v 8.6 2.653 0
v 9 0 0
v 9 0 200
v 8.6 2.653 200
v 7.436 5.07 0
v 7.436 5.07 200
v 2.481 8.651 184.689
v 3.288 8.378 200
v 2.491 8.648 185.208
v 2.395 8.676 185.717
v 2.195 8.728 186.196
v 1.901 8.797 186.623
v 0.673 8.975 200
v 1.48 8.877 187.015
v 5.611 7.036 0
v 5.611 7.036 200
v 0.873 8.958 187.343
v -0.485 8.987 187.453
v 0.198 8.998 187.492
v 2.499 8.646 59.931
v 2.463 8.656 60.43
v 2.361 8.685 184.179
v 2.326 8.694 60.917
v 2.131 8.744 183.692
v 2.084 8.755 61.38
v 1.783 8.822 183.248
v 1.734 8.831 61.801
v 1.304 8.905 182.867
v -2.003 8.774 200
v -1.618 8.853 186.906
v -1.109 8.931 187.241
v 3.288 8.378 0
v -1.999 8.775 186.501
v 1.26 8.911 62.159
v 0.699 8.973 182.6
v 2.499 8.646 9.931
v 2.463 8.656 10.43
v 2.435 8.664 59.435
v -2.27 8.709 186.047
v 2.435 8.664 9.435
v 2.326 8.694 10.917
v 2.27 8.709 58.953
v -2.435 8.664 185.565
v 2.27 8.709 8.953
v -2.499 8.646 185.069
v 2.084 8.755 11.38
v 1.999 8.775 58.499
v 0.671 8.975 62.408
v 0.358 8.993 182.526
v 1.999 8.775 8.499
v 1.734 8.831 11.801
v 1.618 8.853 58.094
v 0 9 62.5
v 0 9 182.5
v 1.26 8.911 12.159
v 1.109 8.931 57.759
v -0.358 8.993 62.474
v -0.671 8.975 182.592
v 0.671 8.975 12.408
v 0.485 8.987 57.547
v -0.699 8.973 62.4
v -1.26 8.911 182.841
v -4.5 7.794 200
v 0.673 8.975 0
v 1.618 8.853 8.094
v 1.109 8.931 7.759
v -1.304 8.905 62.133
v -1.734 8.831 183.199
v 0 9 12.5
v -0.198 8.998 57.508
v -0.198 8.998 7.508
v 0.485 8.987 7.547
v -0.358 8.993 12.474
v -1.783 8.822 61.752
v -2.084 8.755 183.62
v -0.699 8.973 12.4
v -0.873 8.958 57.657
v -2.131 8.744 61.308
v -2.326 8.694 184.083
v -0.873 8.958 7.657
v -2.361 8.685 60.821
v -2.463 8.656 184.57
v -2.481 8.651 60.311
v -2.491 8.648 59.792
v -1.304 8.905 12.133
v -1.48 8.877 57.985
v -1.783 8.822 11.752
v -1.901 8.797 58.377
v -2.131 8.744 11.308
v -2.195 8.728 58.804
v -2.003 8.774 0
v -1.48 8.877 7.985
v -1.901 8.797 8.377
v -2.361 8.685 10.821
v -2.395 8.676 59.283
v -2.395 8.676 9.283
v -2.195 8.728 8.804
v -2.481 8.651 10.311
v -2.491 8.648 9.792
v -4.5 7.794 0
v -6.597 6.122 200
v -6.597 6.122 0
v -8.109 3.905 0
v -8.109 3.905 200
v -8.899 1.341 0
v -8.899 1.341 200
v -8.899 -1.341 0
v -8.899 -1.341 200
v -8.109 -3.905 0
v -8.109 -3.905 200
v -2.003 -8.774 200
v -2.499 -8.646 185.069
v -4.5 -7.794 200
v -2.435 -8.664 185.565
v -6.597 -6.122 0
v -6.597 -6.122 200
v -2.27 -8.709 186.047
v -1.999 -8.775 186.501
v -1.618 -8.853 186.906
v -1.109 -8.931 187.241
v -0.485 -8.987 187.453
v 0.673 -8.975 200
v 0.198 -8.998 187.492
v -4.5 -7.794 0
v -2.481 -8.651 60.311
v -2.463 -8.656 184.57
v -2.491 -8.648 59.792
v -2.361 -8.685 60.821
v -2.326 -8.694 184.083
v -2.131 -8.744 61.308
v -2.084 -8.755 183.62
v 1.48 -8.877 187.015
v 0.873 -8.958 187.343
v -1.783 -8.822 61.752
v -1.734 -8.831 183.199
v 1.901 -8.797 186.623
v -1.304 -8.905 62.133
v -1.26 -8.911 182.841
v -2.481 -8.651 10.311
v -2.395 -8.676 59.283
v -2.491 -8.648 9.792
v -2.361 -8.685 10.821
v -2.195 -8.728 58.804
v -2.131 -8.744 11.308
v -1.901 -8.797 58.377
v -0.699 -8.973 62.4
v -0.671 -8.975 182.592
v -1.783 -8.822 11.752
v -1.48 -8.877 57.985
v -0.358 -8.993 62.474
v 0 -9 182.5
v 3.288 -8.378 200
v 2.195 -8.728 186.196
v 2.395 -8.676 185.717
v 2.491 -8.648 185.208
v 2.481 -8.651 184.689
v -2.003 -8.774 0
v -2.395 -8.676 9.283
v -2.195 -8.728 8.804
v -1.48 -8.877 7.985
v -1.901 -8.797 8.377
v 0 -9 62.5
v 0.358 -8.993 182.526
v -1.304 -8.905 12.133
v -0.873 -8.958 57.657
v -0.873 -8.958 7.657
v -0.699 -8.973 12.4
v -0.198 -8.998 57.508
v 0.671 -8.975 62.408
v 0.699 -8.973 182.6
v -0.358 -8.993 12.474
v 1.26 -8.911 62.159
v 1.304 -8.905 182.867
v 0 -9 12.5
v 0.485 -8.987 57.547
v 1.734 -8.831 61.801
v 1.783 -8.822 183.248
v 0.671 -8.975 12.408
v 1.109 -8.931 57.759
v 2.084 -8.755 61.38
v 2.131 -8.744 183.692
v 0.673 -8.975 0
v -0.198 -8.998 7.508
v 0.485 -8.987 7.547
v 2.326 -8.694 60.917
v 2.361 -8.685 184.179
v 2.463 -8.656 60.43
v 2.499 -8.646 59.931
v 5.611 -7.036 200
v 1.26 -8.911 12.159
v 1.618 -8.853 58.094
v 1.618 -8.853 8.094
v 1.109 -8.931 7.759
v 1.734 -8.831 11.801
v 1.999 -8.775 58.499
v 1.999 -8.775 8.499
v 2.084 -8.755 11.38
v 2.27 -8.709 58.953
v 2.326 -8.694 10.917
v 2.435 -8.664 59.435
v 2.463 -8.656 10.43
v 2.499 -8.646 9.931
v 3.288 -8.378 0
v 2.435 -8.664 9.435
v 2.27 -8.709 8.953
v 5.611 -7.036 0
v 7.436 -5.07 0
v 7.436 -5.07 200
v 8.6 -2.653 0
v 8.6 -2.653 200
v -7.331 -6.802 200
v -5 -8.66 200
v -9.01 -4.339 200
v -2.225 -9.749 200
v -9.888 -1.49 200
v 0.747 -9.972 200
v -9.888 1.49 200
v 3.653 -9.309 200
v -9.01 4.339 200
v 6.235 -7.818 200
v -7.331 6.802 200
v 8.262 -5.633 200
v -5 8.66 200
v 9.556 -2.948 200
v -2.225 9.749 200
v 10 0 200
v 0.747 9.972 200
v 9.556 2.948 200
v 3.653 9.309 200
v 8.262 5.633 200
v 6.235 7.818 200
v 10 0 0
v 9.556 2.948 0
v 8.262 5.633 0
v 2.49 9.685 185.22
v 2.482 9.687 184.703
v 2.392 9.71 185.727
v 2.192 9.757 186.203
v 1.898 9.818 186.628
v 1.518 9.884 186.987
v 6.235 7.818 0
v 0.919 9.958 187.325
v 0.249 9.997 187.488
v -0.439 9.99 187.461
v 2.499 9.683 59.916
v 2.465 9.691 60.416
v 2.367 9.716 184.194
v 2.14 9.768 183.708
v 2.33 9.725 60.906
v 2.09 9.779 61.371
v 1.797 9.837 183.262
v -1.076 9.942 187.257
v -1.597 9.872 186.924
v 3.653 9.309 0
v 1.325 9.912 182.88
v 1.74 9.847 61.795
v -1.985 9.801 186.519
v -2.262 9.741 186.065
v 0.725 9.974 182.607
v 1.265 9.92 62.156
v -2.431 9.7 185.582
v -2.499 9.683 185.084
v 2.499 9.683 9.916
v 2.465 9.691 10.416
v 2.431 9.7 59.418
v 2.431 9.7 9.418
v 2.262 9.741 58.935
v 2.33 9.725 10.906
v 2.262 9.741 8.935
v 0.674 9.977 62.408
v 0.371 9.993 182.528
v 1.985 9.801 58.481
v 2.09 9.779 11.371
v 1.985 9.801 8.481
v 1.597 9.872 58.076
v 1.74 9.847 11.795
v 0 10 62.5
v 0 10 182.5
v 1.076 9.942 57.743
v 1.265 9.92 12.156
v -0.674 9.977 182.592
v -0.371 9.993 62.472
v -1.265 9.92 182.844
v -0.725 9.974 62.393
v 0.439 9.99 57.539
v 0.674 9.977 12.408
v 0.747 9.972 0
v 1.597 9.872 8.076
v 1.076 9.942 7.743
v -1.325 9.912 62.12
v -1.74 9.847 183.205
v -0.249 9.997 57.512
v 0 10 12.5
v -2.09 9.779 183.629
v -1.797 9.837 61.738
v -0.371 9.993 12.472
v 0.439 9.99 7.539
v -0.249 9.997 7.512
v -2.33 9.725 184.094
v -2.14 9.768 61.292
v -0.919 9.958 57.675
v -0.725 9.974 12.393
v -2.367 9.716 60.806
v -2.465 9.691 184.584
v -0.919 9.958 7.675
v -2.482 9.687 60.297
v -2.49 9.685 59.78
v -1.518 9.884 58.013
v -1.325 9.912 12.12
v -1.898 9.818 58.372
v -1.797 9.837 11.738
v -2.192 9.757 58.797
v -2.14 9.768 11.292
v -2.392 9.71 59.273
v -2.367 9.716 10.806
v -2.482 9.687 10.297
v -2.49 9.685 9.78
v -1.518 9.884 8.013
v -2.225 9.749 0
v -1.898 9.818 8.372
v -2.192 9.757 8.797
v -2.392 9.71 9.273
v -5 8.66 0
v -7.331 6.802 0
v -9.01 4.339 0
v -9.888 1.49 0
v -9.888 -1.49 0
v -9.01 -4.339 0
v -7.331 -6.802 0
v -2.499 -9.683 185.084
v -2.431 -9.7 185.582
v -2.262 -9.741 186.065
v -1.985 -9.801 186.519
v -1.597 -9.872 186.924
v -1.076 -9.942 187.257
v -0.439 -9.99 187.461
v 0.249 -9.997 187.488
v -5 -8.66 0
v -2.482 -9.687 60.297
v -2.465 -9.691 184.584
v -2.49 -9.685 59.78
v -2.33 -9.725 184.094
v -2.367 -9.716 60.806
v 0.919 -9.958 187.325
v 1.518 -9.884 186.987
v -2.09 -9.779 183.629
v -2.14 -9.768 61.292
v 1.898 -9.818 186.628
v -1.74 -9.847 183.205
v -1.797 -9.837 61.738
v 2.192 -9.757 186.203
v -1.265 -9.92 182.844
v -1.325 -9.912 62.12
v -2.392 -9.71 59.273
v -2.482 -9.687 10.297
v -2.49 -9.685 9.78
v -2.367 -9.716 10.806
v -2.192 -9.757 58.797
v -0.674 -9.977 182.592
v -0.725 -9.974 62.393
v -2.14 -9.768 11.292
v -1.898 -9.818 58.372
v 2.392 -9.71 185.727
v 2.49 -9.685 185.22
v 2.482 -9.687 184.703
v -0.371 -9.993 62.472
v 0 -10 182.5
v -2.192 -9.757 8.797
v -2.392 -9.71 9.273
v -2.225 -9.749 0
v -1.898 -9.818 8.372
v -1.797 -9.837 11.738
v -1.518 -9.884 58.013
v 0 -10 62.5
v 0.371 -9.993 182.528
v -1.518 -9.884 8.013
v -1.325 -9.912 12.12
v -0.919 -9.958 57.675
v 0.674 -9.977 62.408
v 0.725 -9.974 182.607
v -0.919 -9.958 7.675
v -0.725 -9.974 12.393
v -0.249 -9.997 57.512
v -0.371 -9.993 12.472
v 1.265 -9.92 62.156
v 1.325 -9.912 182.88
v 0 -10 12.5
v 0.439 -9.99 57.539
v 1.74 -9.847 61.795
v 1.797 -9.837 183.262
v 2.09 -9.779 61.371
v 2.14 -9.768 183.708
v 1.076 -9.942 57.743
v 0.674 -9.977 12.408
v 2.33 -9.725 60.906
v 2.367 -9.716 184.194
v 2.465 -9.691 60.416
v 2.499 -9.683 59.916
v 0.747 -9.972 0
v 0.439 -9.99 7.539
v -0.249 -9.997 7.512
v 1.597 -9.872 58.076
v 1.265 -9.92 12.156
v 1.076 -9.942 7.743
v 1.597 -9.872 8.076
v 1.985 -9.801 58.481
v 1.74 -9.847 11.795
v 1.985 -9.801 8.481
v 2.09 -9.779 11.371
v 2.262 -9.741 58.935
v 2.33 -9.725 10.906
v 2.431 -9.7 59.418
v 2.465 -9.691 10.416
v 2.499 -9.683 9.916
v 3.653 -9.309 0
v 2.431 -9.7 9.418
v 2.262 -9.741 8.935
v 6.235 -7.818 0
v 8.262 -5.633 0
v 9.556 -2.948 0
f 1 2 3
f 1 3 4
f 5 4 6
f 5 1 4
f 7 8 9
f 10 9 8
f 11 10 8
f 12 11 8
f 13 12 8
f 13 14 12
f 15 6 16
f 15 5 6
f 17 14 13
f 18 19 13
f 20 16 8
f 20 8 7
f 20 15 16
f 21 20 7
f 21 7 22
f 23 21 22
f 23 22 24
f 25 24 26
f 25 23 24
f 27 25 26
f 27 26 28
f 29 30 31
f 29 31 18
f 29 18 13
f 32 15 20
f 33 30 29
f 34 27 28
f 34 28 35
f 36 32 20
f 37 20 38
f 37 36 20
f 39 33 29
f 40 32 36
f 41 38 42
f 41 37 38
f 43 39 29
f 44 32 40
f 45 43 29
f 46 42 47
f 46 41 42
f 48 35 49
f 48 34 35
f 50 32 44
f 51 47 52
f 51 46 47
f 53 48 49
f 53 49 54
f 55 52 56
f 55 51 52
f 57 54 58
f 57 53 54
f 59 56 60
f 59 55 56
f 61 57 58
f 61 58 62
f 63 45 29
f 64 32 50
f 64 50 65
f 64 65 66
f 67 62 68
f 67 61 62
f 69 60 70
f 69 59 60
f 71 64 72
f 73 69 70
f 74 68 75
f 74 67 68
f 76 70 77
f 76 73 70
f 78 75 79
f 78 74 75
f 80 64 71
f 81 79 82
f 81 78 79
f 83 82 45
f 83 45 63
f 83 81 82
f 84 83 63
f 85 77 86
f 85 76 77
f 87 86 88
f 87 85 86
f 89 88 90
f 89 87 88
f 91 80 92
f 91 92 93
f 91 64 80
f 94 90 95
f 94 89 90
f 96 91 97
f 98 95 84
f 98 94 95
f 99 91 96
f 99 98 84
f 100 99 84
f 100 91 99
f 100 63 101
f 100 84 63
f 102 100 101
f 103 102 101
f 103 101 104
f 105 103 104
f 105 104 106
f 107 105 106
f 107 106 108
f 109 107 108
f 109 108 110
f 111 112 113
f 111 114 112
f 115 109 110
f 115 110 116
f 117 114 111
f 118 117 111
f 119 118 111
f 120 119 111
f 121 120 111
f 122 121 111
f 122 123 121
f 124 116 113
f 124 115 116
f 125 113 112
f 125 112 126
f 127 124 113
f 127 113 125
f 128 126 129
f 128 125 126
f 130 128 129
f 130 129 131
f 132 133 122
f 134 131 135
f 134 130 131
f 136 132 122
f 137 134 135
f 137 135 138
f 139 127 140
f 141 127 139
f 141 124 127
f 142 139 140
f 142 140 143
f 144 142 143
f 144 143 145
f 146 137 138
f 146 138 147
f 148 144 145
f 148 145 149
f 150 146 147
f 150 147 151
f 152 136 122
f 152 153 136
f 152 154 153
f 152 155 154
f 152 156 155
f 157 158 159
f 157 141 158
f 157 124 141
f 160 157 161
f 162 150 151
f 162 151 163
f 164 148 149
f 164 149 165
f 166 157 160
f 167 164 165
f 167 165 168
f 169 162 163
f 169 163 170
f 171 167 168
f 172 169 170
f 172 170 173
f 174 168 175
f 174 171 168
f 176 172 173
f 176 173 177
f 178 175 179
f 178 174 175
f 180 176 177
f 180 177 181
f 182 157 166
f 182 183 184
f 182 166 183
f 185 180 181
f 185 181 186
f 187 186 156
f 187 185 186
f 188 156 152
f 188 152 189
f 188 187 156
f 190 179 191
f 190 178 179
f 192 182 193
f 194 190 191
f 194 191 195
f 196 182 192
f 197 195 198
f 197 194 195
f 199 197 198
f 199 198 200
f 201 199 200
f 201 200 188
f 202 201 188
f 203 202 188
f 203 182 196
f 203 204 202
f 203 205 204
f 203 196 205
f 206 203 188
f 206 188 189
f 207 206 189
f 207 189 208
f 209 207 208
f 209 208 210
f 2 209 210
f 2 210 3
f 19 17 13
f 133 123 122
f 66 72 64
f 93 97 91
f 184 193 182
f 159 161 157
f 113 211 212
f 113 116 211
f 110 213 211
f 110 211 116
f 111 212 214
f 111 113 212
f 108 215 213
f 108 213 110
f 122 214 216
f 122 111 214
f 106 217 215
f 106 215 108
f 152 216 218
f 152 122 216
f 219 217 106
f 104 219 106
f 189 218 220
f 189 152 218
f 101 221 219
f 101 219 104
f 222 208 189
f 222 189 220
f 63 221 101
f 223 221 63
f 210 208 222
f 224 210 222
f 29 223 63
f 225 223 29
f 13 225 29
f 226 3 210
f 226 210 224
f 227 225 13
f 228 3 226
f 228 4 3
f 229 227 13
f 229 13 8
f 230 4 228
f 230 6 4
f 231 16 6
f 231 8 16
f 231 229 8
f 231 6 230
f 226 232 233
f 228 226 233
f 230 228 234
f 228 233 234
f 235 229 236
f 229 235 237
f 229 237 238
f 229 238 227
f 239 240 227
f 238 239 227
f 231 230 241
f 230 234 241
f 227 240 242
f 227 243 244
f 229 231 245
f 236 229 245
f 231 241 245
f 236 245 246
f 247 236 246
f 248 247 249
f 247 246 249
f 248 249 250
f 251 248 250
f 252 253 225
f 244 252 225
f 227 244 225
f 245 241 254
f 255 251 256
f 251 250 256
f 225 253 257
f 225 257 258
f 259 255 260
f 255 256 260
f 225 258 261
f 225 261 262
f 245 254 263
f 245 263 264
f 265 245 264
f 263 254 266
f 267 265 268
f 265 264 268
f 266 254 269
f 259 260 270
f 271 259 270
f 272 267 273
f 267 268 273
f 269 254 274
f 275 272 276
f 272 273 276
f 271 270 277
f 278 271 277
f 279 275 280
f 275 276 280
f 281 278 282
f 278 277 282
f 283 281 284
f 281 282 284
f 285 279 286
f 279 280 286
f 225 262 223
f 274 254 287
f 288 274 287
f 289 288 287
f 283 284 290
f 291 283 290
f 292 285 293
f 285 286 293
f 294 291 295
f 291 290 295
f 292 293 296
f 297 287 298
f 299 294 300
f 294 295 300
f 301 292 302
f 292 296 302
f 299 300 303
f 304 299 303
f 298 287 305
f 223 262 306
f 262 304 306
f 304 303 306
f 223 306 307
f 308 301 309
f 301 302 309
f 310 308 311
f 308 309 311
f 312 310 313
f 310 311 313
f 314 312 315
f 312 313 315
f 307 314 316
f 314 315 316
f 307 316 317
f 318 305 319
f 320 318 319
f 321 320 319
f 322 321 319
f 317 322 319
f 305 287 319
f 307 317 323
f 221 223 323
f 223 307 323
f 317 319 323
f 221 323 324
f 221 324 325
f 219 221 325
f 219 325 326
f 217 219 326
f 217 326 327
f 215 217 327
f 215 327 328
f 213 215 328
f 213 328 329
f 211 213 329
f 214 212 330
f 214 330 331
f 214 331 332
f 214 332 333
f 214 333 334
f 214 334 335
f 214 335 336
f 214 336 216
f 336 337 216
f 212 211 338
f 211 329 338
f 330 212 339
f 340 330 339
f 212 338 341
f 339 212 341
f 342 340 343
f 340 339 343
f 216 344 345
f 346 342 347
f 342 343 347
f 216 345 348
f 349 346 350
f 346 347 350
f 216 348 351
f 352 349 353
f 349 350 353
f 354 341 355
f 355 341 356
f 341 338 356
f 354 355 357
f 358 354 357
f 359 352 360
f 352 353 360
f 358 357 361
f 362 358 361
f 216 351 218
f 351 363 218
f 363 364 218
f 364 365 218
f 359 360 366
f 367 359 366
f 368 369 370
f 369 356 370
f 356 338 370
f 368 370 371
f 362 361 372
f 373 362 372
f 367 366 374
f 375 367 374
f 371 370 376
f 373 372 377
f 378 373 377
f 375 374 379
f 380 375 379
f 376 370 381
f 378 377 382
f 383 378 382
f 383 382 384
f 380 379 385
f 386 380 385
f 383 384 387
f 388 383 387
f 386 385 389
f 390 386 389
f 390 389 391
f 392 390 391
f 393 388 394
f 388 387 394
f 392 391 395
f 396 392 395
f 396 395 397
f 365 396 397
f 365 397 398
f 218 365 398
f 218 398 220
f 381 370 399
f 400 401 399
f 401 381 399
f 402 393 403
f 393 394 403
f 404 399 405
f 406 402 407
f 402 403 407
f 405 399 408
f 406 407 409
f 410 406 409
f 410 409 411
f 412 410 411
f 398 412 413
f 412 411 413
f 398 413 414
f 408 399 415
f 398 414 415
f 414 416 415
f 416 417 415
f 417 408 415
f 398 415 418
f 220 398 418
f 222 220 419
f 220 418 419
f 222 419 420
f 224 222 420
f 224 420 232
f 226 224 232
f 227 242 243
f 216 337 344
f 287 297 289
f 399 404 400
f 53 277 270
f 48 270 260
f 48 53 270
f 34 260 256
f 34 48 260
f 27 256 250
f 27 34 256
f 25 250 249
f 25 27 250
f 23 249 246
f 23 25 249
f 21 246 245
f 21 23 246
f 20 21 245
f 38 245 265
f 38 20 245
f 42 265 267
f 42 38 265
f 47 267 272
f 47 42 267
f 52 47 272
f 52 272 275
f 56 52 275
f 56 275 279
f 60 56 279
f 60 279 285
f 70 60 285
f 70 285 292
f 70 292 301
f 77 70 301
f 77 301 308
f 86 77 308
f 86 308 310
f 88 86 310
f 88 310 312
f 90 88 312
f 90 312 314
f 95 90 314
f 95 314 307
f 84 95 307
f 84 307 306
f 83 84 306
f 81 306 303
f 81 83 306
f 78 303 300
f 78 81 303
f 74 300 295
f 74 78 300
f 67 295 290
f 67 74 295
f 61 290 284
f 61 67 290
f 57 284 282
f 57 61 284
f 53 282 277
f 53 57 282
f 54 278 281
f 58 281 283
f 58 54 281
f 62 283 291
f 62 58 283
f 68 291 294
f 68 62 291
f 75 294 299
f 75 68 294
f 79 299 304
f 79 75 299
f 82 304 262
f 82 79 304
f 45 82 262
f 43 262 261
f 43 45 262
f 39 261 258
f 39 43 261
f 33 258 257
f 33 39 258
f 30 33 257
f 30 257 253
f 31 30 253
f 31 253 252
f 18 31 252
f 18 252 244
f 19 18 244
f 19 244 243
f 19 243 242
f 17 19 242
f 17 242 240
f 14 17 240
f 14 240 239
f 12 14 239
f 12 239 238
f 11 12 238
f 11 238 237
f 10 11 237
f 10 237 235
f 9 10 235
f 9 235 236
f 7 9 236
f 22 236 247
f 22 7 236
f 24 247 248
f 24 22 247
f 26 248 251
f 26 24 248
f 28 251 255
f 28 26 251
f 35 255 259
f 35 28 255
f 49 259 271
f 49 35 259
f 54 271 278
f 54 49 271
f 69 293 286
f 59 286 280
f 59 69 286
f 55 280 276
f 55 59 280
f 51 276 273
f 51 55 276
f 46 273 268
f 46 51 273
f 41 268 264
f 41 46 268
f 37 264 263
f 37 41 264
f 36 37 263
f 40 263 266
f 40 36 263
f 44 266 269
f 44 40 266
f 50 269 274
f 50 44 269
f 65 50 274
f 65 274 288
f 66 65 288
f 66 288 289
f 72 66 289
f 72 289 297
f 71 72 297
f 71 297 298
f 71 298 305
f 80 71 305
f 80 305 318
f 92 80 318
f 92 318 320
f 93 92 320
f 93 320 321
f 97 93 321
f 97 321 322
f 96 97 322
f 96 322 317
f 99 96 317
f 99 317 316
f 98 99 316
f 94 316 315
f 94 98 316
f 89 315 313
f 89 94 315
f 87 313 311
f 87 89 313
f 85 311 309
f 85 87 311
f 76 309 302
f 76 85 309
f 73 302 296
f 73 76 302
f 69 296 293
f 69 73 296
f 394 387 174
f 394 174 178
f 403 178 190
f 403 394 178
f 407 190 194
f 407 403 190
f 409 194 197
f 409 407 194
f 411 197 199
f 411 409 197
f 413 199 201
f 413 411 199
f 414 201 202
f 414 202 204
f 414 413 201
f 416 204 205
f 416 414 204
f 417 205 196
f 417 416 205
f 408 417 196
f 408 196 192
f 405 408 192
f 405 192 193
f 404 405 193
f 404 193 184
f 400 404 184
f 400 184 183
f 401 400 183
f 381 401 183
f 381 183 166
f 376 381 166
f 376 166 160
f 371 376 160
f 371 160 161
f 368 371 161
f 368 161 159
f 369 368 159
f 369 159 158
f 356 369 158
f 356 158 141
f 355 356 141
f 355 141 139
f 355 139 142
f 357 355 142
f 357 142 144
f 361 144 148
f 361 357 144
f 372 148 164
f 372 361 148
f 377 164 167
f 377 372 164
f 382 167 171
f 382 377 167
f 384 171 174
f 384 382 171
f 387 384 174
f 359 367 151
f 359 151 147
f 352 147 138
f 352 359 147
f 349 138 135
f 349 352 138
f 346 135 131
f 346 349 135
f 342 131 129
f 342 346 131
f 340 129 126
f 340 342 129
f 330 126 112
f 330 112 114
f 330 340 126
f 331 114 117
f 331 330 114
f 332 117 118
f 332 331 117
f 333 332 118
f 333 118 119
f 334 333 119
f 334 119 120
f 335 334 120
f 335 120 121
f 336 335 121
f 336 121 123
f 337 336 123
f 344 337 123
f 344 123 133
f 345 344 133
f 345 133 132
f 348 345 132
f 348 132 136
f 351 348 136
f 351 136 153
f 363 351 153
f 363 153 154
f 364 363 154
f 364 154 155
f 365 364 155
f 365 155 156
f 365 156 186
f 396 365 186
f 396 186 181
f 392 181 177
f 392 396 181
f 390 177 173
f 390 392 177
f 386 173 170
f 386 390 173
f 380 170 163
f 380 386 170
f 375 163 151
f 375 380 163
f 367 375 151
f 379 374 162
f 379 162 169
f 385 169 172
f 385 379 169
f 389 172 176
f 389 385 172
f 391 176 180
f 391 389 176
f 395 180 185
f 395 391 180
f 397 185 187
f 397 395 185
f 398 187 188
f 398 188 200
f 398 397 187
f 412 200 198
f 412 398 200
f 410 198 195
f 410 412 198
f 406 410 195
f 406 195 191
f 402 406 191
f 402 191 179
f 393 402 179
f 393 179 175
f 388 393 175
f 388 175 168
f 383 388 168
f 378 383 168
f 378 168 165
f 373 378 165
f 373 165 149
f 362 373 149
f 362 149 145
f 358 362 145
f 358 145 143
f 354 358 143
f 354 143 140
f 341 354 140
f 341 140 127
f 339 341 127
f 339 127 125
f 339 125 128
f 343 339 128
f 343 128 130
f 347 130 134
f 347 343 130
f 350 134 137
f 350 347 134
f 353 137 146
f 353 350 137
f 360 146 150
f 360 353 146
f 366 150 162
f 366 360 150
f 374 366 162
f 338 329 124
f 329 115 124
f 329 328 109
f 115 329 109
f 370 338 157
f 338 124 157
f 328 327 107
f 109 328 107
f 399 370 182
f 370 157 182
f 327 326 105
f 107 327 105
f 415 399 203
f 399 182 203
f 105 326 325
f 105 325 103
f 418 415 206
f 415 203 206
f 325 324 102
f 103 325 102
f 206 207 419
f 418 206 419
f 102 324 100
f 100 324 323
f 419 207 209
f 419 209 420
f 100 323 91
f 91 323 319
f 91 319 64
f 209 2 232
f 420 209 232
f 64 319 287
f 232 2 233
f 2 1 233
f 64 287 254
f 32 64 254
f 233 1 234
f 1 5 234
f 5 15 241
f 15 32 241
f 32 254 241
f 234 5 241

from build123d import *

# Parameters (mm, degrees)
IZIM1_R                     = 10
IZIM1_R_2                   = 9
Y_KSEKLIK_EKSTR_ZYON1_DEPTH = 200
KES_EKSTR_ZYON1_DEPTH       = 200
KES_EKSTR_ZYON1_DEPTH_BACK  = 200
IZIM2_R                     = 2.5
KES_EKSTR_ZYON2_DEPTH       = 200
KES_EKSTR_ZYON2_DEPTH_BACK  = 200
IZIM3_R                     = 2.5


with BuildPart() as part:
    # Çizim1 → Yükseklik-Ekstrüzyon1 (new body)
    with BuildSketch(Plane.XY):
        Circle(IZIM1_R)
        Circle(IZIM1_R_2, mode=Mode.SUBTRACT)
    extrude(amount=Y_KSEKLIK_EKSTR_ZYON1_DEPTH)

    # Çizim2 → Kes-Ekstrüzyon1 (cut, two sides: drawn at the far end of the back side and taken through both)
    with BuildSketch(Plane(origin=(0, 0, 0), x_dir=(1, 0, 0), z_dir=(0, 1, 0)).offset(-KES_EKSTR_ZYON1_DEPTH_BACK)):
        with Locations((0, -10)):
            Circle(IZIM2_R)
        with Locations((0, -60)):
            Circle(IZIM2_R)
    extrude(amount=KES_EKSTR_ZYON1_DEPTH + KES_EKSTR_ZYON1_DEPTH_BACK, mode=Mode.SUBTRACT)

    # Çizim3 → Kes-Ekstrüzyon2 (cut, two sides: drawn at the far end of the back side and taken through both)
    with BuildSketch(Plane(origin=(0, 0, 0), x_dir=(1, 0, 0), z_dir=(0, 1, 0)).offset(-KES_EKSTR_ZYON2_DEPTH_BACK)):
        with Locations((0, -185)):
            Circle(IZIM3_R)
    extrude(amount=KES_EKSTR_ZYON2_DEPTH + KES_EKSTR_ZYON2_DEPTH_BACK, mode=Mode.SUBTRACT)


solid = part.part
